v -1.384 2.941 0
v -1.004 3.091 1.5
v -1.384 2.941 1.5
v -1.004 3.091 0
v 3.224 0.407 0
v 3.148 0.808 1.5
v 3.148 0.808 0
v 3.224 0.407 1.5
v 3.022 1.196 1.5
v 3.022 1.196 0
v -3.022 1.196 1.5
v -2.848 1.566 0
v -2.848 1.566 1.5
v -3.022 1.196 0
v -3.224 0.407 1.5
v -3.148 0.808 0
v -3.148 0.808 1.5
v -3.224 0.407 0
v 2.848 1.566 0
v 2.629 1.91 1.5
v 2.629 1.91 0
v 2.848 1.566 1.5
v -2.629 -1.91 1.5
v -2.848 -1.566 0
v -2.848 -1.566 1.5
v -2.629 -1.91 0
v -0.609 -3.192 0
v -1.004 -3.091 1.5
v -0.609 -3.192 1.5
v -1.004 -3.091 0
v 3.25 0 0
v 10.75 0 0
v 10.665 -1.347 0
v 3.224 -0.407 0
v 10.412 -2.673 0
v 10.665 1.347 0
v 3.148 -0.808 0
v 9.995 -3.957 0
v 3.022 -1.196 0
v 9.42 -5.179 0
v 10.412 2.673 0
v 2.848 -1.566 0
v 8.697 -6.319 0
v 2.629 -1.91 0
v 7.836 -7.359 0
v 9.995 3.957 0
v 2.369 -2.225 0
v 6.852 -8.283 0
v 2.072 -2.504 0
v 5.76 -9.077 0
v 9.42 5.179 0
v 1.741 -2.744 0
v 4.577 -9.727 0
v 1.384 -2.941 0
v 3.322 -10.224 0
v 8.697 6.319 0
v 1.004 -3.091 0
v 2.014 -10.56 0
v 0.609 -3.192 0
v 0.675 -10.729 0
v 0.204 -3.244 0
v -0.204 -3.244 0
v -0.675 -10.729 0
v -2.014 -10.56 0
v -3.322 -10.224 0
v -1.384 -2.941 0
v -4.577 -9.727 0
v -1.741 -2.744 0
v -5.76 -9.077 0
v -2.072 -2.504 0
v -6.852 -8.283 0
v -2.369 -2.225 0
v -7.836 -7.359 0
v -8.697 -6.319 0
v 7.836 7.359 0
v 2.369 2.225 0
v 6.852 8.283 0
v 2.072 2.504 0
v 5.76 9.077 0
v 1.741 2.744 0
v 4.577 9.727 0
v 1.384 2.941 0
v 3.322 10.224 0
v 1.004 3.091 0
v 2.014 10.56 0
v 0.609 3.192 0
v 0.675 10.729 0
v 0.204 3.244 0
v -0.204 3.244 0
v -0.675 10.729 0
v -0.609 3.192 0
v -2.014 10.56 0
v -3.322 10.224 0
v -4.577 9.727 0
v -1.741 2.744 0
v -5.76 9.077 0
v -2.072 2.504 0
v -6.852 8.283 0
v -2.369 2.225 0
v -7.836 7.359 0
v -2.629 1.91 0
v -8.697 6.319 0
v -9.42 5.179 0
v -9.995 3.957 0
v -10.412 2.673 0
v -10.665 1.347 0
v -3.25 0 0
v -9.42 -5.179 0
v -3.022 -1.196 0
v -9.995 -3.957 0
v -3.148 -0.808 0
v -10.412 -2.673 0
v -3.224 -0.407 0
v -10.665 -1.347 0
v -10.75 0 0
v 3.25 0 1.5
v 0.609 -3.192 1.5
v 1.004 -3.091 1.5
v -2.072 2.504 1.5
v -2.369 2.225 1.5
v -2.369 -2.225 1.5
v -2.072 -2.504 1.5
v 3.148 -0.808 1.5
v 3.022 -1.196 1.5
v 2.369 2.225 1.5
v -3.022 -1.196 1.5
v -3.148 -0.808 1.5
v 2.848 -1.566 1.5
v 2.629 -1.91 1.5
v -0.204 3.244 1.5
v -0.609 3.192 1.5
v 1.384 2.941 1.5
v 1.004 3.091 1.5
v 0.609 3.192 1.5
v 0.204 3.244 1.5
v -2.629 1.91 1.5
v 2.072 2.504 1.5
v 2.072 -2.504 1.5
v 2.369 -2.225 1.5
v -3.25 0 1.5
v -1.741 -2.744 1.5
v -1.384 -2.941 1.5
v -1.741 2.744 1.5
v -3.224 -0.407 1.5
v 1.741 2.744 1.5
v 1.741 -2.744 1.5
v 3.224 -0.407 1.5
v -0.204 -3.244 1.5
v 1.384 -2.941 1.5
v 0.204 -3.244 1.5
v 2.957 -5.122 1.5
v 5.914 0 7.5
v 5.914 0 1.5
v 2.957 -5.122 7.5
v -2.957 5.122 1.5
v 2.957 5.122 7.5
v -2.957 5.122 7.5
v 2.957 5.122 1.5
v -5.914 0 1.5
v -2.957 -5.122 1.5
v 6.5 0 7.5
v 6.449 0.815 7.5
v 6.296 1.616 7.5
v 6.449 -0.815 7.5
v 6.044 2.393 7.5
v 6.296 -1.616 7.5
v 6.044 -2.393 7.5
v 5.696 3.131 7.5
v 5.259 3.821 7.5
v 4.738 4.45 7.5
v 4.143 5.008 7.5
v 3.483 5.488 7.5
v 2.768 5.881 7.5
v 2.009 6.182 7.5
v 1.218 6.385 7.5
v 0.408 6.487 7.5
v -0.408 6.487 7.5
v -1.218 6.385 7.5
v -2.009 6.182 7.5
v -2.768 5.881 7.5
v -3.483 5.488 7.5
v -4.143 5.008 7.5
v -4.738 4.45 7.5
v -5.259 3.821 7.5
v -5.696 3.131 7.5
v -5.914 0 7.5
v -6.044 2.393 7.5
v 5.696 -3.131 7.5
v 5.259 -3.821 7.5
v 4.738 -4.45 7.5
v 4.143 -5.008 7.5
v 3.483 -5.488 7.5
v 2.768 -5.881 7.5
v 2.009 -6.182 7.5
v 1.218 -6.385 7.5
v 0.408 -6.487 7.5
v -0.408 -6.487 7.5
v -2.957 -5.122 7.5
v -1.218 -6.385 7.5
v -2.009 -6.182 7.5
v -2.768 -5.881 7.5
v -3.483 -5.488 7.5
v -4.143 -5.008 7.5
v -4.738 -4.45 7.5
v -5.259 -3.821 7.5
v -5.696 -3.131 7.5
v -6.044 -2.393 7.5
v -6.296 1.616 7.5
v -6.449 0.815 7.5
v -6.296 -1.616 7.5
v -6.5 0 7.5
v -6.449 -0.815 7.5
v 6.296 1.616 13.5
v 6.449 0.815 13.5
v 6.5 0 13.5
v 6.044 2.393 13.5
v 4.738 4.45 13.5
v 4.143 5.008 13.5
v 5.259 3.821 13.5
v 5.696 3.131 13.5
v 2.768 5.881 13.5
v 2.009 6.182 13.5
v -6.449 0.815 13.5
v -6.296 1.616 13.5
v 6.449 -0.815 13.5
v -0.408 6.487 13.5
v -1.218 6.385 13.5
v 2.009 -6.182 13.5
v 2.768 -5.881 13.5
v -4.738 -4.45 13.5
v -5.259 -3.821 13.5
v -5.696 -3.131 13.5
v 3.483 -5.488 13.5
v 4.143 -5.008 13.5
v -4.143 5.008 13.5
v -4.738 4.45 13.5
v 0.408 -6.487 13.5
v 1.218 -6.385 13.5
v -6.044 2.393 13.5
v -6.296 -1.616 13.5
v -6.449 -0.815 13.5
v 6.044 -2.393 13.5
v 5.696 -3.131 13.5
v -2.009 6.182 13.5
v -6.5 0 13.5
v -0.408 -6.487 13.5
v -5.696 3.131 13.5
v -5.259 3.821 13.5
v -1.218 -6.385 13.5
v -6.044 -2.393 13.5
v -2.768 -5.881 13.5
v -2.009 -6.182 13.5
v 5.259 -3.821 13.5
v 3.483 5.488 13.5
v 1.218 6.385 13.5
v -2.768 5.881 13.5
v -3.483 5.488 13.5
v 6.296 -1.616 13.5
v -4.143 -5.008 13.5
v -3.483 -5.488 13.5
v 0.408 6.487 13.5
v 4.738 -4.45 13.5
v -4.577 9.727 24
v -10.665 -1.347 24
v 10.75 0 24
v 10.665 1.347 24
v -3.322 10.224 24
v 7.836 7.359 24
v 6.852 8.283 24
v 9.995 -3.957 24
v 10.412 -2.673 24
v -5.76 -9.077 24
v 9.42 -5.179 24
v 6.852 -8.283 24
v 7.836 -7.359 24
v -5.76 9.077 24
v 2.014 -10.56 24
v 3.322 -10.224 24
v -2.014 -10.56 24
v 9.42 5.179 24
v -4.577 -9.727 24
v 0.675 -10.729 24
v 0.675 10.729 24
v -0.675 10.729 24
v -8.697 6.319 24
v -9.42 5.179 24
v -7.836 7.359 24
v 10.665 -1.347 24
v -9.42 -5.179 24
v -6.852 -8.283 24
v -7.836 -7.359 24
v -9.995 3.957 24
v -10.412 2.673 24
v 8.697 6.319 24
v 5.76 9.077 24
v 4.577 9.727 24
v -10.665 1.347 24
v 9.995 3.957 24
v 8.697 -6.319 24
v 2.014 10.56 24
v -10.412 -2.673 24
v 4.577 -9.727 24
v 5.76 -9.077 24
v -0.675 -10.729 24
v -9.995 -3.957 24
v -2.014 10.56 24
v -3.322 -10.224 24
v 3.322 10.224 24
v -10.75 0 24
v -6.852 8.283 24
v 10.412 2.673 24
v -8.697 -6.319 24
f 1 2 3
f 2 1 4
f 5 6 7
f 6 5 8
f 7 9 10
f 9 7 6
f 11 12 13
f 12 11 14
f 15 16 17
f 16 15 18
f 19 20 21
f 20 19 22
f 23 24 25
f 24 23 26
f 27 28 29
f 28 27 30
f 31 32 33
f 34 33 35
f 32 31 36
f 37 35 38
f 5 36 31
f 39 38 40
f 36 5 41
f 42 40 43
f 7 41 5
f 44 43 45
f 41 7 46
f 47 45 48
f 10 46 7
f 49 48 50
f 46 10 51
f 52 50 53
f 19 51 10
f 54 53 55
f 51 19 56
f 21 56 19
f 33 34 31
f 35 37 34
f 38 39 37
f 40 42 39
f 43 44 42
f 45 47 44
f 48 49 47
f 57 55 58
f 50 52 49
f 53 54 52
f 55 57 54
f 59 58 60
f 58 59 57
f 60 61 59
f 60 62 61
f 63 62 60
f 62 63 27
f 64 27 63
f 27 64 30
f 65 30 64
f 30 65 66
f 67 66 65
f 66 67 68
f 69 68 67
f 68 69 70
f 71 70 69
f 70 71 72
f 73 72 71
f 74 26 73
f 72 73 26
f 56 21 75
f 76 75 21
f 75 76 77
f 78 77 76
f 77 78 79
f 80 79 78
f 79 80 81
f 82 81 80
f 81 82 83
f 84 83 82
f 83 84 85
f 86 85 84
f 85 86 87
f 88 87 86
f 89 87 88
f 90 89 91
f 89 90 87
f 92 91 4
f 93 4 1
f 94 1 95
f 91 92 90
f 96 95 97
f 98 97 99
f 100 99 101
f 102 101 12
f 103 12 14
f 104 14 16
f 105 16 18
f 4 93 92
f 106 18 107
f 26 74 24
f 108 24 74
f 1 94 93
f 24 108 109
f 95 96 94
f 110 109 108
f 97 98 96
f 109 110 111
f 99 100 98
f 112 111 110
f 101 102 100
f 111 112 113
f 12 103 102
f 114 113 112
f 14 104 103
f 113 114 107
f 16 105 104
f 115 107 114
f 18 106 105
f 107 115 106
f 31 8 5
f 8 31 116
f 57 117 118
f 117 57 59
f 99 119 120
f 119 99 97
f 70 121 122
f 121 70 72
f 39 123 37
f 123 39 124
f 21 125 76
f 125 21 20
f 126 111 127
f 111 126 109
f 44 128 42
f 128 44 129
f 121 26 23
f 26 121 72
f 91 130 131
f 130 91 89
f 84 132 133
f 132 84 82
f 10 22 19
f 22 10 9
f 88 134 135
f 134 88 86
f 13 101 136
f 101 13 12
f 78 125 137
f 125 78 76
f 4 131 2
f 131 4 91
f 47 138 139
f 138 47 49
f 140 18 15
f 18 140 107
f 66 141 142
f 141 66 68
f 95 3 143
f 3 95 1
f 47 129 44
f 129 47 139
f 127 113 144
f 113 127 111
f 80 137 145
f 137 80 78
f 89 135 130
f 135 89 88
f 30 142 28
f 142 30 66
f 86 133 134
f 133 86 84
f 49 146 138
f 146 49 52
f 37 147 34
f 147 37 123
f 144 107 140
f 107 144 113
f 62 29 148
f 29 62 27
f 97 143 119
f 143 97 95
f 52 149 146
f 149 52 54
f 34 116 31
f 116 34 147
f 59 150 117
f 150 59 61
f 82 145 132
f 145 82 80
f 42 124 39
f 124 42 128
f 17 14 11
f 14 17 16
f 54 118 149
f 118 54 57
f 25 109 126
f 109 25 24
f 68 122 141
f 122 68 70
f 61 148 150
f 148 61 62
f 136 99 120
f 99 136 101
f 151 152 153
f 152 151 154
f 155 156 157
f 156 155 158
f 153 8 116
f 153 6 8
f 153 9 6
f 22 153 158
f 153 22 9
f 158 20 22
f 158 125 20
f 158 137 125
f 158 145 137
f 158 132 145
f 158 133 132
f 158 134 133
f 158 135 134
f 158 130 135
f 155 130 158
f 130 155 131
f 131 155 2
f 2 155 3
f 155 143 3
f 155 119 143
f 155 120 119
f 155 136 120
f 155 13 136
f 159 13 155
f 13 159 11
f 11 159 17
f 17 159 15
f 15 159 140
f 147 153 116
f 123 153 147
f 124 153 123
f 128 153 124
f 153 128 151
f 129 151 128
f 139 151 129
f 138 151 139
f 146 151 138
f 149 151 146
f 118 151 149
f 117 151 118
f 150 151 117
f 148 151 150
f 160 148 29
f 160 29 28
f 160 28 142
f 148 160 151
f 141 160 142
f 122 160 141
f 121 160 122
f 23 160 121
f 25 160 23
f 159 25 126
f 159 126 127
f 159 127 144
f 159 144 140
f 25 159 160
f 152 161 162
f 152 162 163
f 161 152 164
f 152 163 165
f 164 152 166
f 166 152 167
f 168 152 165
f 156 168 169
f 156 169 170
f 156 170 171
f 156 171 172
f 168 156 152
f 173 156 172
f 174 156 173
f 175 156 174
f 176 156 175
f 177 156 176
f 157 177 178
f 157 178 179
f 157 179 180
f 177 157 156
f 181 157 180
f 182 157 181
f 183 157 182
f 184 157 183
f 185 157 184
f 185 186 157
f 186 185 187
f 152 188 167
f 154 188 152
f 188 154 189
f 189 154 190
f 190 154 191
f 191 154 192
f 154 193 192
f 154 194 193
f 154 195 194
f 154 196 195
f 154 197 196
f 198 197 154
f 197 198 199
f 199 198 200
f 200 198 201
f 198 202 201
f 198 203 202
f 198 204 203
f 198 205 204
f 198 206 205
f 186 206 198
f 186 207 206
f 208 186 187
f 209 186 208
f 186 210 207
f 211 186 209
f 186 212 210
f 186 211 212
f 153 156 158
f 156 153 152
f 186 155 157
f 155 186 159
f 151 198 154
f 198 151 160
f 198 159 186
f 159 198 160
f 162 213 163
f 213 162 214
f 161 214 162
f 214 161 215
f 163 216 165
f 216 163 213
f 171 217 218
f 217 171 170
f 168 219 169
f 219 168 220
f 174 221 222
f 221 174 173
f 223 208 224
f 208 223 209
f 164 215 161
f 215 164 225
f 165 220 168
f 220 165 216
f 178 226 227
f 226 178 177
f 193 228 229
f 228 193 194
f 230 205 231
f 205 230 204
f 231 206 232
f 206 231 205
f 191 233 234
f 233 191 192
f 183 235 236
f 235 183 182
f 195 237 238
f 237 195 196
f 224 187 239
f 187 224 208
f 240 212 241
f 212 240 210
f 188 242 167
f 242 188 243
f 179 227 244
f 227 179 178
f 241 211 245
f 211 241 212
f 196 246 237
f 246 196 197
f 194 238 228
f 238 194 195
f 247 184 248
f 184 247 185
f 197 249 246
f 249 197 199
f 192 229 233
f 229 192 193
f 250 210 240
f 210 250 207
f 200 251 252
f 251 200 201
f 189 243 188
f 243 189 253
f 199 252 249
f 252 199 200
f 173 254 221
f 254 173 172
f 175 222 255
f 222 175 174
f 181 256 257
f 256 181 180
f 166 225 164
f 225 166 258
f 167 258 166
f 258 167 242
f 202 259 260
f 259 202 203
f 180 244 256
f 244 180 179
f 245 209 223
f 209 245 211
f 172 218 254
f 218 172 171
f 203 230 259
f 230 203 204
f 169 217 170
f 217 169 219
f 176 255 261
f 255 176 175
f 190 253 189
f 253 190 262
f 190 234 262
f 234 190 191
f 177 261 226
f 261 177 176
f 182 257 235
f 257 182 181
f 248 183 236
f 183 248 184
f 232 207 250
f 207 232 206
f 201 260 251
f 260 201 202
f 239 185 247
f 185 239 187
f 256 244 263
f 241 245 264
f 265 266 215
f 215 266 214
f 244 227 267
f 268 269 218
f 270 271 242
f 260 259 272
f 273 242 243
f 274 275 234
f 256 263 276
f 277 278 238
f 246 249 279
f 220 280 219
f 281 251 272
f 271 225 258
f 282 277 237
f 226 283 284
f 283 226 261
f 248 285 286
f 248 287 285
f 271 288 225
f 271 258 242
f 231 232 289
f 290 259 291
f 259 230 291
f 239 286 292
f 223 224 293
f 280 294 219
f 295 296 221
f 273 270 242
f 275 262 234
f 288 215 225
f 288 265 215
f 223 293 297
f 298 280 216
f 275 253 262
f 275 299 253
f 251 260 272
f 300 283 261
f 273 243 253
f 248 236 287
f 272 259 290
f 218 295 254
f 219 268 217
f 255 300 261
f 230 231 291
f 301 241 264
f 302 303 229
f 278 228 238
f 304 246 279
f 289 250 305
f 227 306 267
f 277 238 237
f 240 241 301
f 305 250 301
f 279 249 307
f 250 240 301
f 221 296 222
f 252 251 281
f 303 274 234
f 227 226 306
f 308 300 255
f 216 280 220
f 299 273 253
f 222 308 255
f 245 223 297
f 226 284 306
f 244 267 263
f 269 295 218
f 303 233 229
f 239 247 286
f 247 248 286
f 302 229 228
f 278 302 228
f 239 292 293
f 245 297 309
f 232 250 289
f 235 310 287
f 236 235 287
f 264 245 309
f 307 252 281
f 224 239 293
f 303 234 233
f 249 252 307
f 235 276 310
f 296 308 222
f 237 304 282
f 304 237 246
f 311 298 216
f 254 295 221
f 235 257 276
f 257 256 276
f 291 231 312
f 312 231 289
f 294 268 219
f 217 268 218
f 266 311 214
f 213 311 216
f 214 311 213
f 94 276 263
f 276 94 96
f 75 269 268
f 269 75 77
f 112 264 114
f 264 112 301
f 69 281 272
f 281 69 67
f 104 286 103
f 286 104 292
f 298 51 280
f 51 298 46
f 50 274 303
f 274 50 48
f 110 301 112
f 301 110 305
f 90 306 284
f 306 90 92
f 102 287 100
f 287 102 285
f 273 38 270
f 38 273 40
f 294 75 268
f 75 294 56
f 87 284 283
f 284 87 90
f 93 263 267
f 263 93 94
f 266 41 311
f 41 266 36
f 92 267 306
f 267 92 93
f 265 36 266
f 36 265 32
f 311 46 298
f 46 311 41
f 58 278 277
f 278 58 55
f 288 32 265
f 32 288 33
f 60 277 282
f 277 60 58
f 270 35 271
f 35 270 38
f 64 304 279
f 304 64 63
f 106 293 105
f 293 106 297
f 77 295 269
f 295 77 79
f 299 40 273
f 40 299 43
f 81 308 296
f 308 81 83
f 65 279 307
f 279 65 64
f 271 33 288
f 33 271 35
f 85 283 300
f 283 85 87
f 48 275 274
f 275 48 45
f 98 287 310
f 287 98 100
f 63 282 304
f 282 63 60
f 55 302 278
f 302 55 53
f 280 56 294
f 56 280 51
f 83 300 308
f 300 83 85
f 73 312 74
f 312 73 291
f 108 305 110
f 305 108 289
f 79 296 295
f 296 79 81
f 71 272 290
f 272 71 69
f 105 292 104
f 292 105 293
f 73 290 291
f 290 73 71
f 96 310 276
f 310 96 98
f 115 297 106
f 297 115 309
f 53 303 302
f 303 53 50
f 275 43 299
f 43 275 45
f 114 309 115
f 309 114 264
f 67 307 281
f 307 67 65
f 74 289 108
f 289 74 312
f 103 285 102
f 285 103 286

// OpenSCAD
$fn = 50;


difference() {
	union() {
		*color(alpha = 1.0000000000, c = "gray") {
			translate(v = [0, 14, 0]) {
				linear_extrude(height = 1) {
					text(font = "Arial:style=Bold", halign = "center", size = 4.5000000000, text = "COMMENT description oobb_cylinder_shape_p_type_24_depth_bolt_stacker_extra_1.5_diameter_24_thickness_10.75_radius_bottom_zz", valign = "center");
				}
			}
		}
		cylinder(h = 24, r = 10.7500000000);
	}
	union() {
		translate(v = [0, 0, 0]) {
			rotate(a = [0, 0, 0]) {
				difference() {
					union() {
						cylinder(h = 100, r = 3.2500000000);
					}
					union();
				}
			}
		}
		translate(v = [0, 0, 1.5000000000]) {
			rotate(a = [0, 0, 0]) {
				difference() {
					union() {
						linear_extrude(height = 6) {
							polygon(points = [[5.9142500000, 0.0000000000], [2.9571250000, 5.1218907443], [-2.9571250000, 5.1218907443], [-5.9142500000, 0.0000000000], [-2.9571250000, -5.1218907443], [2.9571250000, -5.1218907443]]);
						}
					}
					union();
				}
			}
		}
		*color(alpha = 1.0000000000, c = "gray") {
			translate(v = [0, 14, 0]) {
				linear_extrude(height = 1) {
					text(font = "Arial:style=Bold", halign = "center", size = 4.5000000000, text = "COMMENT description oobb_hole_new_shape_n_type_m6_radius_name_bolt_stacker_extra_1.5_diameter_24_thickness", valign = "center");
				}
			}
		}
		*color(alpha = 1.0000000000, c = "gray") {
			translate(v = [0, 14, 1.5000000000]) {
				linear_extrude(height = 1) {
					text(font = "Arial:style=Bold", halign = "center", size = 4.5000000000, text = "COMMENT description oobb_nut_shape_n_type_m6_radius_name_6_depth_0_0_1.5_pos_bolt_stacker_extra_1.5_diameter_24_thickness_bottom_zz", valign = "center");
				}
			}
		}
		*color(alpha = 1.0000000000, c = "gray") {
			translate(v = [0, 14, 7.5000000000]) {
				linear_extrude(height = 1) {
					text(font = "Arial:style=Bold", halign = "center", size = 4.5000000000, text = "COMMENT description oobb_cylinder_shape_n_type_6_depth_0_0_7.5_pos_bolt_stacker_extra_1.5_diameter_24_thickness_6.5_radius_bottom_zz", valign = "center");
				}
			}
		}
		translate(v = [0, 0, 7.5000000000]) {
			cylinder(h = 6, r = 6.5000000000);
		}
		*color(alpha = 1.0000000000, c = "gray") {
			translate(v = [0, 14, 24]) {
				linear_extrude(height = 1) {
					text(font = "Arial:style=Bold", halign = "center", size = 4.5000000000, text = "COMMENT description oobb_cylinder_shape_n_type_10.5_depth_0_0_24_pos_bolt_stacker_extra_1.5_diameter_24_thickness_10.75_r2_6.5_r1_top_zz", valign = "center");
				}
			}
		}
		translate(v = [0, 0, 13.5000000000]) {
			cylinder(h = 10.5000000000, r1 = 6.5000000000, r2 = 10.7500000000);
		}
	}
}
